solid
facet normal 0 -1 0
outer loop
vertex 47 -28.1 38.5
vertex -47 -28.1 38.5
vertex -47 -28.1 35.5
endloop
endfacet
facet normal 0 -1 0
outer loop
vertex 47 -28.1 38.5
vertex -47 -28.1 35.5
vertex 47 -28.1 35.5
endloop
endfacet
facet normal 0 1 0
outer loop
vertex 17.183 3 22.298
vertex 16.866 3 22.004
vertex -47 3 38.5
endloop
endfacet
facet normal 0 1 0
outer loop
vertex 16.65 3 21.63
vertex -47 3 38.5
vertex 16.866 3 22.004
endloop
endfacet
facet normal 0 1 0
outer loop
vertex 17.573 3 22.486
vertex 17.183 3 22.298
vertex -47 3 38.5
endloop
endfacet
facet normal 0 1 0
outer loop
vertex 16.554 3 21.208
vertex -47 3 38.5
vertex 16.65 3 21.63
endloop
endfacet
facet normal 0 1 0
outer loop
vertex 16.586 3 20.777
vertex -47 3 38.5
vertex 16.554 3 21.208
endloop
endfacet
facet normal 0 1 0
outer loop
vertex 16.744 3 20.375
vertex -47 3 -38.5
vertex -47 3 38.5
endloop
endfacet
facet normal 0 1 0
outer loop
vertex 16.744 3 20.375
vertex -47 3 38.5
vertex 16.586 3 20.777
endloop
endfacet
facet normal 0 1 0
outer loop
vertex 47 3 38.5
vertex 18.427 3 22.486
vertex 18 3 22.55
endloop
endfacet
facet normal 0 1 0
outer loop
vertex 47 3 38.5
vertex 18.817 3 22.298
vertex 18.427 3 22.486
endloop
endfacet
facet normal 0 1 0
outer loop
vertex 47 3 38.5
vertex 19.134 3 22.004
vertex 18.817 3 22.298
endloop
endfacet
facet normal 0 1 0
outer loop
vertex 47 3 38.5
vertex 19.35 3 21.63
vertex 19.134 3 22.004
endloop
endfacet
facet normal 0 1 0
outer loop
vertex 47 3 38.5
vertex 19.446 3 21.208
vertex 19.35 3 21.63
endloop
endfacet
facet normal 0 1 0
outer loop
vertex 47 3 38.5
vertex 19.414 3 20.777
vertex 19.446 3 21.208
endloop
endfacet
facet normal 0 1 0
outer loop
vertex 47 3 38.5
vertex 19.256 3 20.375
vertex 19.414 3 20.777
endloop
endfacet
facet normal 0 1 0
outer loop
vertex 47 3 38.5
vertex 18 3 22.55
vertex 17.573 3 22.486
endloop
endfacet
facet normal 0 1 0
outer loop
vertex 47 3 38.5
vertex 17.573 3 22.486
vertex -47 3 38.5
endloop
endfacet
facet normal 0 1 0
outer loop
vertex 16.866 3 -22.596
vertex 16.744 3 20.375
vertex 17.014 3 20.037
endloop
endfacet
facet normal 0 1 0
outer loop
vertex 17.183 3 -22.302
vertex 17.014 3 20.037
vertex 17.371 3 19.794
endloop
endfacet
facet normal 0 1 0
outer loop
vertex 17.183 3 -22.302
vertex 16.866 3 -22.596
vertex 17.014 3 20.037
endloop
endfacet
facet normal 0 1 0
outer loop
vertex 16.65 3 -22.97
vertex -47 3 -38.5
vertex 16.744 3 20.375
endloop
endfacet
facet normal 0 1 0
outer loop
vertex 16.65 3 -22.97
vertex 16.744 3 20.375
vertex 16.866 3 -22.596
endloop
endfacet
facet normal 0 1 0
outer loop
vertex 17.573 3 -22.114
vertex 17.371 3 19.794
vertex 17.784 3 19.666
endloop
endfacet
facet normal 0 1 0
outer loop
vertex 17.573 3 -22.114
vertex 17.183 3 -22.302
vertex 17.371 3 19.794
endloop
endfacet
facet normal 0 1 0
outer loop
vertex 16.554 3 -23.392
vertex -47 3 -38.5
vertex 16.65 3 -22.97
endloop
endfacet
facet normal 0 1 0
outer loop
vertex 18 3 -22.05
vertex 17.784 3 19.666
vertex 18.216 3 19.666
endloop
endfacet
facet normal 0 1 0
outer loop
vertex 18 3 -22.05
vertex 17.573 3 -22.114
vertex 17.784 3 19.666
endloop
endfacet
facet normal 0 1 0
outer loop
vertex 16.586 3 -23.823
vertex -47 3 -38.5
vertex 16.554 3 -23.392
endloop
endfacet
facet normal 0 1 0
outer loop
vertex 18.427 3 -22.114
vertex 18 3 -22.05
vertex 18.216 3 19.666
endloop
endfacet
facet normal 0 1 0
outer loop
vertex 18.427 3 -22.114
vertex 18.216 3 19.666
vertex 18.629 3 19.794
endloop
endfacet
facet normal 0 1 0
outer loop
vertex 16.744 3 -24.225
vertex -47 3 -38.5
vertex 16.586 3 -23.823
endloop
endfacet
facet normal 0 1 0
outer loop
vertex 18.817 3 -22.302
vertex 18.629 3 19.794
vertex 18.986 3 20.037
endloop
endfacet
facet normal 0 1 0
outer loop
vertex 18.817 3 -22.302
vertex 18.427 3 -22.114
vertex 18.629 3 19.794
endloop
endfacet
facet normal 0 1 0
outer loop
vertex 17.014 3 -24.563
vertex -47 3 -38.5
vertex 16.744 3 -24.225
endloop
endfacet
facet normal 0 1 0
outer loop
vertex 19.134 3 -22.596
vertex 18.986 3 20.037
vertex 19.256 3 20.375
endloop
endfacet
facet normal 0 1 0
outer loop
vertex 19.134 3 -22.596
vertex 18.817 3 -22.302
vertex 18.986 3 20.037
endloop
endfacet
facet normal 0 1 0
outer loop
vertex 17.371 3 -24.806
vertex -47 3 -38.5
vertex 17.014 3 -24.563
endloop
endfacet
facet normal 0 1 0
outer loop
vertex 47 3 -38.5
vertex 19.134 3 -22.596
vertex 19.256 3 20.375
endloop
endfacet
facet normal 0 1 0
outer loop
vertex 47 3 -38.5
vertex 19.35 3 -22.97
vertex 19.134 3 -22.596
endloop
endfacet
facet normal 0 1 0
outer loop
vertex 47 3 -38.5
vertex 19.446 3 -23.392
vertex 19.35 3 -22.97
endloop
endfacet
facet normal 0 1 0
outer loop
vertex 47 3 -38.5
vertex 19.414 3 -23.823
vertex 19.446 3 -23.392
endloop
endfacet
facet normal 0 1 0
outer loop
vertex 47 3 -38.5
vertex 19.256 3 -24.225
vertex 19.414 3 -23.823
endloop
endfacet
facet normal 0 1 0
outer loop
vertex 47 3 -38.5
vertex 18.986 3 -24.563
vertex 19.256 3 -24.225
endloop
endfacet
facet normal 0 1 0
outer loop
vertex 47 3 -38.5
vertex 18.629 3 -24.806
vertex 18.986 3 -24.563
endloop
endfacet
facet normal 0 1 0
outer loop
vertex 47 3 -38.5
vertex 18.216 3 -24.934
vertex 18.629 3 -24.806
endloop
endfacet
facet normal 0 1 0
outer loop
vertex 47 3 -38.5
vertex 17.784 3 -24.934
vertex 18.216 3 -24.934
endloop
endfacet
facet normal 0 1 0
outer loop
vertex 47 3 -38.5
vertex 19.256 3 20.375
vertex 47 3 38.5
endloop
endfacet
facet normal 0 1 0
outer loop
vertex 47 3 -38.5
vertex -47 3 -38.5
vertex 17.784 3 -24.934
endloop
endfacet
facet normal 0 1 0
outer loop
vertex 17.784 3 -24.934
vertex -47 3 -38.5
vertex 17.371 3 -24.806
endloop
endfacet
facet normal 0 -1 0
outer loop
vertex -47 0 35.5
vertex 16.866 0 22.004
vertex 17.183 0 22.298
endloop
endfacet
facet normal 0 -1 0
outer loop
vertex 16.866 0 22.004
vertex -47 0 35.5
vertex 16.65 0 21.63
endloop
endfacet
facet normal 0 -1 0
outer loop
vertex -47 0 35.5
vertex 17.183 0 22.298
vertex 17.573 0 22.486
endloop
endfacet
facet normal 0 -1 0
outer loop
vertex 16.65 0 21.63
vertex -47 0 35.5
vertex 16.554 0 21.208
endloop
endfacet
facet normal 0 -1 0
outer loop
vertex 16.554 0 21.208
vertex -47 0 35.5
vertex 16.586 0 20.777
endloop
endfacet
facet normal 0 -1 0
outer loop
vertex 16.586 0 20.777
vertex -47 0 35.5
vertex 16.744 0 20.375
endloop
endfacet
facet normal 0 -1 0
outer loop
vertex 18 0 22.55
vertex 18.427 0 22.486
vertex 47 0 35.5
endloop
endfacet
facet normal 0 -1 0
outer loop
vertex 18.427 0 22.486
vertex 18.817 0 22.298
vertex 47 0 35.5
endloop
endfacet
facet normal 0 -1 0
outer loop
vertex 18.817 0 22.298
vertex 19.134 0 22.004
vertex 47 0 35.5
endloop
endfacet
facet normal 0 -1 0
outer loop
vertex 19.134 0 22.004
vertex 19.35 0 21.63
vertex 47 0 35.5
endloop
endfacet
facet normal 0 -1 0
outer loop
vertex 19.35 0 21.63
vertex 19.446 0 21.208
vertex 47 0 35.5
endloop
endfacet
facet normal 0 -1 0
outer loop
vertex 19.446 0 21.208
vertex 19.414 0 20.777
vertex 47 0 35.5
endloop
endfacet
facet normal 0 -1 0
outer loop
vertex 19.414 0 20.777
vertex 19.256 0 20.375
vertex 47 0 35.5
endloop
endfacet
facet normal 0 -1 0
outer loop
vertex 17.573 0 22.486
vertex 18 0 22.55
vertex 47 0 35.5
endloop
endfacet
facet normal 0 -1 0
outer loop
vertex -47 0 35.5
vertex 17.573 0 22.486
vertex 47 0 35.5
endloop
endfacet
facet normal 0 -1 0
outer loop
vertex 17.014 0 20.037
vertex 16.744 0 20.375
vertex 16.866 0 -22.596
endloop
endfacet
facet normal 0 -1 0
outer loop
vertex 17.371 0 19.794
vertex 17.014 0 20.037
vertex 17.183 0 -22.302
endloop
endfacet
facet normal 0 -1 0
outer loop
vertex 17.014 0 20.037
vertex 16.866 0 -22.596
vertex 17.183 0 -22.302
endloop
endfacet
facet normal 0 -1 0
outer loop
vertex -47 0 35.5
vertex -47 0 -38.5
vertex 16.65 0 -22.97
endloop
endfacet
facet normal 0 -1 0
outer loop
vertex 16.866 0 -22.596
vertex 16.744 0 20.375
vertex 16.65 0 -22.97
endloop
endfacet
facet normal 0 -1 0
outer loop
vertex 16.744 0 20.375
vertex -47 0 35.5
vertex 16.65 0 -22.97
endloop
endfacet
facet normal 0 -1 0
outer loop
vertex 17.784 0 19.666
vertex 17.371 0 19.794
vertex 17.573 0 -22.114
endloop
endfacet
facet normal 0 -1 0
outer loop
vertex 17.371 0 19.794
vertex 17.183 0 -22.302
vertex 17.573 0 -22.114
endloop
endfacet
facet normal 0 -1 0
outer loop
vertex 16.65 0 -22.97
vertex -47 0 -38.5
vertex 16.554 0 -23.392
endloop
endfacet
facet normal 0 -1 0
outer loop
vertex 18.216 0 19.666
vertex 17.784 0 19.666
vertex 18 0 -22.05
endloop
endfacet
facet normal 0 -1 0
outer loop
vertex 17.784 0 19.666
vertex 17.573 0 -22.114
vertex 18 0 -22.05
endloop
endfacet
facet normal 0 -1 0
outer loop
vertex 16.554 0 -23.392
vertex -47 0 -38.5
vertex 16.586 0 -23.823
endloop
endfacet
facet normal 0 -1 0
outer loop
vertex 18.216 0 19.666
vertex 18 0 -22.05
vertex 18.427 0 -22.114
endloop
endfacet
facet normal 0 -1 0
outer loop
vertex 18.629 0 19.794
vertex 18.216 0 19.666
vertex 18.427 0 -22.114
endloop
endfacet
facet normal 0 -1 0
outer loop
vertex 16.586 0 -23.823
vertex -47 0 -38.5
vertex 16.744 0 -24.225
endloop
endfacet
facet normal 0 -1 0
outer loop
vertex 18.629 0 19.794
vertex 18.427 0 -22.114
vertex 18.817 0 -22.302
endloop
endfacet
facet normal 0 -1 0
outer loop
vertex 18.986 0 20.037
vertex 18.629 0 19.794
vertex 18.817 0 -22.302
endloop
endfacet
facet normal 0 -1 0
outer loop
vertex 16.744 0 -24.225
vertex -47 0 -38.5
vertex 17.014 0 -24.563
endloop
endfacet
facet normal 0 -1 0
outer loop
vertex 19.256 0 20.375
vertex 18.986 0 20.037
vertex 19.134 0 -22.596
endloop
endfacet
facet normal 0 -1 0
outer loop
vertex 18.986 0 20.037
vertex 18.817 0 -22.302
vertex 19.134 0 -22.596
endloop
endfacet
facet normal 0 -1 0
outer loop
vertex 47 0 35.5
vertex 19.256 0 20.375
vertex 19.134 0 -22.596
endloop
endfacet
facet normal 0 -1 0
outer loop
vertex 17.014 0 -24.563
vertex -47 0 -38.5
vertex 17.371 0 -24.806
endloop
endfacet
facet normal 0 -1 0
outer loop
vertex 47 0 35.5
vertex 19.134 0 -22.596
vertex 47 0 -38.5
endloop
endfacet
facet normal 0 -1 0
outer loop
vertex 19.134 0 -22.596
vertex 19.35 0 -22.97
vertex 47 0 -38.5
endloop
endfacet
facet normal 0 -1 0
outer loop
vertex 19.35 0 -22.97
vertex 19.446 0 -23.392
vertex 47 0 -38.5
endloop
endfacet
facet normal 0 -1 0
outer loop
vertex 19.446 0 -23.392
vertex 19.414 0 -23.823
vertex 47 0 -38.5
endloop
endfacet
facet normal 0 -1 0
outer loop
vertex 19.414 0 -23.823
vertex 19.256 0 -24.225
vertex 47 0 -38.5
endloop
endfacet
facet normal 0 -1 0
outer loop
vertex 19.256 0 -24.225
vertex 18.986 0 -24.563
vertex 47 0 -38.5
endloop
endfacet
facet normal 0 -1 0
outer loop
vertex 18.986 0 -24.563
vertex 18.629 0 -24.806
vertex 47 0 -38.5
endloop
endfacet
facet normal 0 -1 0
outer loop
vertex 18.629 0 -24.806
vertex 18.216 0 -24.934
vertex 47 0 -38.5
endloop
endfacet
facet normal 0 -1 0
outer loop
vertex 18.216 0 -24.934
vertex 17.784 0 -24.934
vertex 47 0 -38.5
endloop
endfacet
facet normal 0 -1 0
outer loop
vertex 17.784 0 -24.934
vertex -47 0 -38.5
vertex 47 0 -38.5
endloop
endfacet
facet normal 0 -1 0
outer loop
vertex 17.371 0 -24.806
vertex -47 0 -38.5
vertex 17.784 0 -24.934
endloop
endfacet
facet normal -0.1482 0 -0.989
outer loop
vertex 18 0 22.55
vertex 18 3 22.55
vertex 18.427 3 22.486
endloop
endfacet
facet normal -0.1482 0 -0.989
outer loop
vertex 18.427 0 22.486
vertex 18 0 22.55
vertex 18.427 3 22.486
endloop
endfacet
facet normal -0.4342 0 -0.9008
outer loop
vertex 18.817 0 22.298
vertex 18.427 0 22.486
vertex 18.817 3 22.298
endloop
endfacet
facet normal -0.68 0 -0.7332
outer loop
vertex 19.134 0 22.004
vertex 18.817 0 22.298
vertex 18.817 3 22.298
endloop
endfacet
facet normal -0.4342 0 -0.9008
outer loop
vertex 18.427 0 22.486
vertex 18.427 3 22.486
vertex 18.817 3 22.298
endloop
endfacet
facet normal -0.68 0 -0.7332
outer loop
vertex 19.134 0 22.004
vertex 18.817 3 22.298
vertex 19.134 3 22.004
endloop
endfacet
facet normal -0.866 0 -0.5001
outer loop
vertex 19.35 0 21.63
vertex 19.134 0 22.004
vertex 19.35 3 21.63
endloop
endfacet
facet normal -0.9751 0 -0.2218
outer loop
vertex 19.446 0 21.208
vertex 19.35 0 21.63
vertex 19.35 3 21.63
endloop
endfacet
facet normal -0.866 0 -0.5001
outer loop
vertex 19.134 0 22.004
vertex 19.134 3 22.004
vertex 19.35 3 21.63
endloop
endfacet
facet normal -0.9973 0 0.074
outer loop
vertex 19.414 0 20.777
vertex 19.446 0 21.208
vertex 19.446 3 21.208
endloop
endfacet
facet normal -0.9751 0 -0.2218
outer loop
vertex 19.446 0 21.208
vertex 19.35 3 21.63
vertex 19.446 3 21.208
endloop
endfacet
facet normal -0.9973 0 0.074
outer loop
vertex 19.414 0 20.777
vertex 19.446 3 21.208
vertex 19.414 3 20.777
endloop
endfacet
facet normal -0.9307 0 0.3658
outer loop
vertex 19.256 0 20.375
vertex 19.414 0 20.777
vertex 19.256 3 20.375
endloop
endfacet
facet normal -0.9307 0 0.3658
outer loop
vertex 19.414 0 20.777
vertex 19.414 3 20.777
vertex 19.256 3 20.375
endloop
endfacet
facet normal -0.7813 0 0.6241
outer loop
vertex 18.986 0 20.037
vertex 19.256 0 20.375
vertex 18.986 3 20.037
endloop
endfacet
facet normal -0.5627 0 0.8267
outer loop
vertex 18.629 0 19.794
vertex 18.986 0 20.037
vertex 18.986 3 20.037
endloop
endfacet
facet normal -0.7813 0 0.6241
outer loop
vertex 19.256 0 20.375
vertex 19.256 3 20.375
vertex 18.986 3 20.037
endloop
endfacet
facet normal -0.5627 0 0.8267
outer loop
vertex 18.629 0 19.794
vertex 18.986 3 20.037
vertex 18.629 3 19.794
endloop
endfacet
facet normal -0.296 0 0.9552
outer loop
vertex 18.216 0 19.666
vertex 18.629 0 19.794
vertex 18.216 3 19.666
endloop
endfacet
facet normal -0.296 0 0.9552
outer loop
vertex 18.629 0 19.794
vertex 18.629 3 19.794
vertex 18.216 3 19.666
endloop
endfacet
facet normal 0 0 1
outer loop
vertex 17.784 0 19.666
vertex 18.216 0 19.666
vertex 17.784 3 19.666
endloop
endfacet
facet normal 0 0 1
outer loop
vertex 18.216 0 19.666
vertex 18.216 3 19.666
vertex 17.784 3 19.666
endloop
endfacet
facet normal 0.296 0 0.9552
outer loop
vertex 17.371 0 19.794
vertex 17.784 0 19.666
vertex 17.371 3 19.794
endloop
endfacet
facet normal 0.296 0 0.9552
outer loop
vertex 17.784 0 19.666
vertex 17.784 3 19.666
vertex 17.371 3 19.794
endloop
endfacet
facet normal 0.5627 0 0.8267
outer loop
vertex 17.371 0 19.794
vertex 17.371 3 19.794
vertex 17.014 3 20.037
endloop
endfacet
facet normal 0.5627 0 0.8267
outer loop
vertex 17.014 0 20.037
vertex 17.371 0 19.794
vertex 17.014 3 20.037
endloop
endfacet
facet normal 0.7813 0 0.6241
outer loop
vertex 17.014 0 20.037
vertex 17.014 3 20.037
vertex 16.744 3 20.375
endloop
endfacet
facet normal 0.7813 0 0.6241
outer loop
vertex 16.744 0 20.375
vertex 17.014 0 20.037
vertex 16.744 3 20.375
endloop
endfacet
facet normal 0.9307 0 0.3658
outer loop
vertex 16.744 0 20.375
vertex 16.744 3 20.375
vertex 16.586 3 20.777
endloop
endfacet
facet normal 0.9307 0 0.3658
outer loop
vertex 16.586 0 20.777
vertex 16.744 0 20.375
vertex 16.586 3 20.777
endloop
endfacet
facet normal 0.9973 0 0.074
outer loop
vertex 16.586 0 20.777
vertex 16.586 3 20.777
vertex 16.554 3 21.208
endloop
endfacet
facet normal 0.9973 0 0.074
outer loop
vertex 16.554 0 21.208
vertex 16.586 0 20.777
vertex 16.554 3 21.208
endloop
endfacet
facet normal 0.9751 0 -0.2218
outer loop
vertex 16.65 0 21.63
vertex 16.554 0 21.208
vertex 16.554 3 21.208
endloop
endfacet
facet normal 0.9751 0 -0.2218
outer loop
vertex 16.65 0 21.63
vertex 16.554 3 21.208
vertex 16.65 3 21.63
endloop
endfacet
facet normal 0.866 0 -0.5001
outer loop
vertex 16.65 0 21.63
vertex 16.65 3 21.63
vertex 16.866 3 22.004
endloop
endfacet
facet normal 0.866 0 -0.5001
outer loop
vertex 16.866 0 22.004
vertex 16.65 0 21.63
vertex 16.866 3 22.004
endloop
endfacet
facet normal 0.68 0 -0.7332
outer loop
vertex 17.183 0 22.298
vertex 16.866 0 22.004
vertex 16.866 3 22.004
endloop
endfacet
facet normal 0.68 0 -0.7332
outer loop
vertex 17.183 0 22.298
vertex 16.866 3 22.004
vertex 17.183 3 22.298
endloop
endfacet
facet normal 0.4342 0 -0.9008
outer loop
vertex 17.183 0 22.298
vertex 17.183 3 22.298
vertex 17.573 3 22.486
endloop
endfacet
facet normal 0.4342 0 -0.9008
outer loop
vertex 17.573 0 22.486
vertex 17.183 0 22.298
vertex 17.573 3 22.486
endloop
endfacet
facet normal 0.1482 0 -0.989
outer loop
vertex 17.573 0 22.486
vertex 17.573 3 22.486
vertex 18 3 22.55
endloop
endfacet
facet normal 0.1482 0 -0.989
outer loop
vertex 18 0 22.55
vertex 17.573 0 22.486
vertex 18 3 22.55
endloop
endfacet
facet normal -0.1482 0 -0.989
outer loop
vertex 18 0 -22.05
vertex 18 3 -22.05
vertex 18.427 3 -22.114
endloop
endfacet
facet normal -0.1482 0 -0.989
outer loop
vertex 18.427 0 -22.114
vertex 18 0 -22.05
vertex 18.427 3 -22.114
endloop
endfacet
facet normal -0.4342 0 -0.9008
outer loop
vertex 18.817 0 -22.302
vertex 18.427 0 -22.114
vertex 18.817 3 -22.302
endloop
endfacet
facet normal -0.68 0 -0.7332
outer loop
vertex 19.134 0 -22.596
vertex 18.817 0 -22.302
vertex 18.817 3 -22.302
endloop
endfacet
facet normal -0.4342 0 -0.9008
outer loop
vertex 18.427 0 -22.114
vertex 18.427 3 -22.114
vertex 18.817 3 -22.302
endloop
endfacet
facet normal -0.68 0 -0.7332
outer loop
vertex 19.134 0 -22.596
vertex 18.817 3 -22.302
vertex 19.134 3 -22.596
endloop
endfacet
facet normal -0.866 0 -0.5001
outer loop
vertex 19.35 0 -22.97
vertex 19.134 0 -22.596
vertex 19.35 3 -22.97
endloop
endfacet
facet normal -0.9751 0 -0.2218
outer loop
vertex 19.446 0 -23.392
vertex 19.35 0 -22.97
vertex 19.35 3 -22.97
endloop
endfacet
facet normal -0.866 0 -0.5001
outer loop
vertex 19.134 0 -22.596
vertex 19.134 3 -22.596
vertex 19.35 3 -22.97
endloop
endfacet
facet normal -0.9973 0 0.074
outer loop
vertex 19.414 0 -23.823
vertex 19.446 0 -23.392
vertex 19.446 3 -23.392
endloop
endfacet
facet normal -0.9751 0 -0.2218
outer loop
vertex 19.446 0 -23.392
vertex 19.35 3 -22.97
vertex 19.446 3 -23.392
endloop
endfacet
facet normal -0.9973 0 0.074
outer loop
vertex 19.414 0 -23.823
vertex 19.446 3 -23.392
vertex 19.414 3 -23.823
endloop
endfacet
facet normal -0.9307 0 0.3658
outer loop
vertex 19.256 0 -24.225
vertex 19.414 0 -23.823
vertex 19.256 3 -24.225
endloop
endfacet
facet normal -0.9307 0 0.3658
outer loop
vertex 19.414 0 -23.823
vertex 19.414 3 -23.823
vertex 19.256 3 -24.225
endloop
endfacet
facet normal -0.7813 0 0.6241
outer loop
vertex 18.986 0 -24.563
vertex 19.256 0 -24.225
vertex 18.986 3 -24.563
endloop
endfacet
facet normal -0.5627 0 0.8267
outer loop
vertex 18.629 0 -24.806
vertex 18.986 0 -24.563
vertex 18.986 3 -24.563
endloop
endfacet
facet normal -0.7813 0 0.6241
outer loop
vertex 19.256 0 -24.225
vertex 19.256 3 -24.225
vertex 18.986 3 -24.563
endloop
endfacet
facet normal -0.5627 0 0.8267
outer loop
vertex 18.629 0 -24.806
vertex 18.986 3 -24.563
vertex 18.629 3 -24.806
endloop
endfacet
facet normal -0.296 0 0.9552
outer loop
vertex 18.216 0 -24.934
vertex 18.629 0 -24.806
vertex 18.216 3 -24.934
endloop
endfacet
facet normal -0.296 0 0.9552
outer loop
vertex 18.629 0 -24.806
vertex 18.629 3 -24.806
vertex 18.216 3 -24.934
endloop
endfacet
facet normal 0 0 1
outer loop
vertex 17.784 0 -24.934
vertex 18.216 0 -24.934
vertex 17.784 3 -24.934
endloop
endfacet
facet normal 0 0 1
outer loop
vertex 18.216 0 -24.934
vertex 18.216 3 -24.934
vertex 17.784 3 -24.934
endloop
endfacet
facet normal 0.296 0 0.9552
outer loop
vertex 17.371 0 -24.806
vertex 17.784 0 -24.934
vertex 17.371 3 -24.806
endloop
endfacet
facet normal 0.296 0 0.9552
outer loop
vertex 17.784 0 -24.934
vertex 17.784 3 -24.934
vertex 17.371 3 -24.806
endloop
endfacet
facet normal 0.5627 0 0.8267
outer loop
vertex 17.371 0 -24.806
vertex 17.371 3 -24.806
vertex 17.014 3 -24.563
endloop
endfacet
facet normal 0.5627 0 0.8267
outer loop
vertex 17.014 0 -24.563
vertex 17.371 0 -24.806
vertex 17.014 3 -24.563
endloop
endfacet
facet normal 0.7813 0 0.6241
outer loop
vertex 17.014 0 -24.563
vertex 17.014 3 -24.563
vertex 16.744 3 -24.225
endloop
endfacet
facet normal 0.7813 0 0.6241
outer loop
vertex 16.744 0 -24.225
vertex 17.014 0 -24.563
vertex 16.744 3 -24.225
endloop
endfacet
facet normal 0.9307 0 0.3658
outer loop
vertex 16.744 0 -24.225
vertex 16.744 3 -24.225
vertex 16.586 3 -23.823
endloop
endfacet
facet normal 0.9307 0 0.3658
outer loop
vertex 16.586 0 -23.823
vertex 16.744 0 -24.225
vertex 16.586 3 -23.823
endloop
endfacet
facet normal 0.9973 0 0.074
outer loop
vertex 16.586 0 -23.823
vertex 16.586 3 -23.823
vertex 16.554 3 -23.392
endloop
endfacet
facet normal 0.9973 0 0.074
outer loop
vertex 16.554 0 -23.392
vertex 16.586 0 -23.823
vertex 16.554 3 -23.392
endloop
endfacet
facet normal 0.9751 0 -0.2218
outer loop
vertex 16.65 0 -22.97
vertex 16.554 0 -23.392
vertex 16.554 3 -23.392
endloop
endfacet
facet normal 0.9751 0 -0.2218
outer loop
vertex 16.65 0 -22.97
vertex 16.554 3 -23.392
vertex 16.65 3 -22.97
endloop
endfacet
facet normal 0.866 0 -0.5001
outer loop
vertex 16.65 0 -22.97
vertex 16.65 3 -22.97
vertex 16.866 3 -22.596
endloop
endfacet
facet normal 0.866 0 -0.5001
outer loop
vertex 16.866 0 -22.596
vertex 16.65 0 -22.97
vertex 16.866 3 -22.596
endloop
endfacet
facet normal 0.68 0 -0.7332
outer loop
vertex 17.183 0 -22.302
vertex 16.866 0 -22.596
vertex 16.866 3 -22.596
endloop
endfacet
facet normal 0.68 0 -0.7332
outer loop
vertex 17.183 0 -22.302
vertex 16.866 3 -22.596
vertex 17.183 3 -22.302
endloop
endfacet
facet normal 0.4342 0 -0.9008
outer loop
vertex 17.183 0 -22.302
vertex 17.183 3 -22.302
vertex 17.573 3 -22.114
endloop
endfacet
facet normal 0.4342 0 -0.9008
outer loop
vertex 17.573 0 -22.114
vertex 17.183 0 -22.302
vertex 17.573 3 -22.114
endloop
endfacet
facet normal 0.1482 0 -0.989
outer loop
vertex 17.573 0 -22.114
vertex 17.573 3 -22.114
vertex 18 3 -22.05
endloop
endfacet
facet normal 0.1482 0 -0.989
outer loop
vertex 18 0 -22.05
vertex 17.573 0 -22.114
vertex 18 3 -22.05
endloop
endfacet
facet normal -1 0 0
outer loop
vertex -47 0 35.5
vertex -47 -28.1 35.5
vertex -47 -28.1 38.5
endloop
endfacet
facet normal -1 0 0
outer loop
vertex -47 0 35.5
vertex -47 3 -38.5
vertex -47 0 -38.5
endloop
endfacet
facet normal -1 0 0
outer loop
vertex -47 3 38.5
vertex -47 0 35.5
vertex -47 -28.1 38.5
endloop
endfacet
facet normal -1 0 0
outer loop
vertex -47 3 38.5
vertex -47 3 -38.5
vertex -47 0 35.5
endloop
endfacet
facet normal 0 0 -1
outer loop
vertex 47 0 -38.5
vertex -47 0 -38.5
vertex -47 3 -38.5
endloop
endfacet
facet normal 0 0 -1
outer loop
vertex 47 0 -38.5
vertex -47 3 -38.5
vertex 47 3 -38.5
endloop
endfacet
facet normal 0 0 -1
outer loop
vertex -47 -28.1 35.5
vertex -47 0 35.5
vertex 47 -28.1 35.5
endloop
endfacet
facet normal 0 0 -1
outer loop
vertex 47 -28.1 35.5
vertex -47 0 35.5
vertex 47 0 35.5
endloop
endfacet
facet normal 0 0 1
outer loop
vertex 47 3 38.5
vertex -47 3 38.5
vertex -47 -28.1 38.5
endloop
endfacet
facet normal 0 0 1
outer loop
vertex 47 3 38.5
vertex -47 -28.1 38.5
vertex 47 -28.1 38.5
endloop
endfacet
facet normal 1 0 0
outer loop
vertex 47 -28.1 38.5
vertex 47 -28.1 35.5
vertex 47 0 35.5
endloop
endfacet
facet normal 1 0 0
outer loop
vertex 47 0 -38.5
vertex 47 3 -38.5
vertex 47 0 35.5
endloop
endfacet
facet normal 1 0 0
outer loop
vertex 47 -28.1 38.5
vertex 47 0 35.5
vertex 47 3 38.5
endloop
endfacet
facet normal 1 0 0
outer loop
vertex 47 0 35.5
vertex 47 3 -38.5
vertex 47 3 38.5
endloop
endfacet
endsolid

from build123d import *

# Parameters (mm, degrees)
SKETCH1_W           = 94
SKETCH1_H           = 77
BOSS_EXTRUDE1_DEPTH = 3
SKETCH2_W           = 94
SKETCH2_H           = 3
BOSS_EXTRUDE2_DEPTH = 28.1
SKETCH3_R           = 1.45
CUT_EXTRUDE1_DEPTH  = 69.252912026
LPATTERN1_COUNT     = 2
LPATTERN1_PITCH     = 44.6


with BuildPart() as part:
    # Sketch1 → Boss-Extrude1 (new body)
    with BuildSketch(Plane(origin=(0, 0, 0), x_dir=(1, 0, 0), z_dir=(0, 1, 0))):
        Rectangle(SKETCH1_W, SKETCH1_H)
    extrude(amount=BOSS_EXTRUDE1_DEPTH)

    # Sketch2 → Boss-Extrude2 (add)
    with BuildSketch(Plane.XZ):
        with Locations((0, 37)):
            Rectangle(SKETCH2_W, SKETCH2_H)
    extrude(amount=BOSS_EXTRUDE2_DEPTH)

    # Sketch3 → Cut-Extrude1 (cut, through all)
    with BuildSketch(Plane(origin=(0, 3, 0), x_dir=(1, 0, 0), z_dir=(0, 1, 0))):
        with Locations(Location((18, 23.5, 0), (0, 0, 270))):
            Circle(SKETCH3_R)
    cut_extrude1 = extrude(amount=-CUT_EXTRUDE1_DEPTH, mode=Mode.SUBTRACT)

    # LPattern1: Cut-Extrude1 ×2
    with Locations(*[(0, 0, i * LPATTERN1_PITCH) for i in range(1, LPATTERN1_COUNT)]):
        add(cut_extrude1, mode=Mode.SUBTRACT)


solid = part.part
